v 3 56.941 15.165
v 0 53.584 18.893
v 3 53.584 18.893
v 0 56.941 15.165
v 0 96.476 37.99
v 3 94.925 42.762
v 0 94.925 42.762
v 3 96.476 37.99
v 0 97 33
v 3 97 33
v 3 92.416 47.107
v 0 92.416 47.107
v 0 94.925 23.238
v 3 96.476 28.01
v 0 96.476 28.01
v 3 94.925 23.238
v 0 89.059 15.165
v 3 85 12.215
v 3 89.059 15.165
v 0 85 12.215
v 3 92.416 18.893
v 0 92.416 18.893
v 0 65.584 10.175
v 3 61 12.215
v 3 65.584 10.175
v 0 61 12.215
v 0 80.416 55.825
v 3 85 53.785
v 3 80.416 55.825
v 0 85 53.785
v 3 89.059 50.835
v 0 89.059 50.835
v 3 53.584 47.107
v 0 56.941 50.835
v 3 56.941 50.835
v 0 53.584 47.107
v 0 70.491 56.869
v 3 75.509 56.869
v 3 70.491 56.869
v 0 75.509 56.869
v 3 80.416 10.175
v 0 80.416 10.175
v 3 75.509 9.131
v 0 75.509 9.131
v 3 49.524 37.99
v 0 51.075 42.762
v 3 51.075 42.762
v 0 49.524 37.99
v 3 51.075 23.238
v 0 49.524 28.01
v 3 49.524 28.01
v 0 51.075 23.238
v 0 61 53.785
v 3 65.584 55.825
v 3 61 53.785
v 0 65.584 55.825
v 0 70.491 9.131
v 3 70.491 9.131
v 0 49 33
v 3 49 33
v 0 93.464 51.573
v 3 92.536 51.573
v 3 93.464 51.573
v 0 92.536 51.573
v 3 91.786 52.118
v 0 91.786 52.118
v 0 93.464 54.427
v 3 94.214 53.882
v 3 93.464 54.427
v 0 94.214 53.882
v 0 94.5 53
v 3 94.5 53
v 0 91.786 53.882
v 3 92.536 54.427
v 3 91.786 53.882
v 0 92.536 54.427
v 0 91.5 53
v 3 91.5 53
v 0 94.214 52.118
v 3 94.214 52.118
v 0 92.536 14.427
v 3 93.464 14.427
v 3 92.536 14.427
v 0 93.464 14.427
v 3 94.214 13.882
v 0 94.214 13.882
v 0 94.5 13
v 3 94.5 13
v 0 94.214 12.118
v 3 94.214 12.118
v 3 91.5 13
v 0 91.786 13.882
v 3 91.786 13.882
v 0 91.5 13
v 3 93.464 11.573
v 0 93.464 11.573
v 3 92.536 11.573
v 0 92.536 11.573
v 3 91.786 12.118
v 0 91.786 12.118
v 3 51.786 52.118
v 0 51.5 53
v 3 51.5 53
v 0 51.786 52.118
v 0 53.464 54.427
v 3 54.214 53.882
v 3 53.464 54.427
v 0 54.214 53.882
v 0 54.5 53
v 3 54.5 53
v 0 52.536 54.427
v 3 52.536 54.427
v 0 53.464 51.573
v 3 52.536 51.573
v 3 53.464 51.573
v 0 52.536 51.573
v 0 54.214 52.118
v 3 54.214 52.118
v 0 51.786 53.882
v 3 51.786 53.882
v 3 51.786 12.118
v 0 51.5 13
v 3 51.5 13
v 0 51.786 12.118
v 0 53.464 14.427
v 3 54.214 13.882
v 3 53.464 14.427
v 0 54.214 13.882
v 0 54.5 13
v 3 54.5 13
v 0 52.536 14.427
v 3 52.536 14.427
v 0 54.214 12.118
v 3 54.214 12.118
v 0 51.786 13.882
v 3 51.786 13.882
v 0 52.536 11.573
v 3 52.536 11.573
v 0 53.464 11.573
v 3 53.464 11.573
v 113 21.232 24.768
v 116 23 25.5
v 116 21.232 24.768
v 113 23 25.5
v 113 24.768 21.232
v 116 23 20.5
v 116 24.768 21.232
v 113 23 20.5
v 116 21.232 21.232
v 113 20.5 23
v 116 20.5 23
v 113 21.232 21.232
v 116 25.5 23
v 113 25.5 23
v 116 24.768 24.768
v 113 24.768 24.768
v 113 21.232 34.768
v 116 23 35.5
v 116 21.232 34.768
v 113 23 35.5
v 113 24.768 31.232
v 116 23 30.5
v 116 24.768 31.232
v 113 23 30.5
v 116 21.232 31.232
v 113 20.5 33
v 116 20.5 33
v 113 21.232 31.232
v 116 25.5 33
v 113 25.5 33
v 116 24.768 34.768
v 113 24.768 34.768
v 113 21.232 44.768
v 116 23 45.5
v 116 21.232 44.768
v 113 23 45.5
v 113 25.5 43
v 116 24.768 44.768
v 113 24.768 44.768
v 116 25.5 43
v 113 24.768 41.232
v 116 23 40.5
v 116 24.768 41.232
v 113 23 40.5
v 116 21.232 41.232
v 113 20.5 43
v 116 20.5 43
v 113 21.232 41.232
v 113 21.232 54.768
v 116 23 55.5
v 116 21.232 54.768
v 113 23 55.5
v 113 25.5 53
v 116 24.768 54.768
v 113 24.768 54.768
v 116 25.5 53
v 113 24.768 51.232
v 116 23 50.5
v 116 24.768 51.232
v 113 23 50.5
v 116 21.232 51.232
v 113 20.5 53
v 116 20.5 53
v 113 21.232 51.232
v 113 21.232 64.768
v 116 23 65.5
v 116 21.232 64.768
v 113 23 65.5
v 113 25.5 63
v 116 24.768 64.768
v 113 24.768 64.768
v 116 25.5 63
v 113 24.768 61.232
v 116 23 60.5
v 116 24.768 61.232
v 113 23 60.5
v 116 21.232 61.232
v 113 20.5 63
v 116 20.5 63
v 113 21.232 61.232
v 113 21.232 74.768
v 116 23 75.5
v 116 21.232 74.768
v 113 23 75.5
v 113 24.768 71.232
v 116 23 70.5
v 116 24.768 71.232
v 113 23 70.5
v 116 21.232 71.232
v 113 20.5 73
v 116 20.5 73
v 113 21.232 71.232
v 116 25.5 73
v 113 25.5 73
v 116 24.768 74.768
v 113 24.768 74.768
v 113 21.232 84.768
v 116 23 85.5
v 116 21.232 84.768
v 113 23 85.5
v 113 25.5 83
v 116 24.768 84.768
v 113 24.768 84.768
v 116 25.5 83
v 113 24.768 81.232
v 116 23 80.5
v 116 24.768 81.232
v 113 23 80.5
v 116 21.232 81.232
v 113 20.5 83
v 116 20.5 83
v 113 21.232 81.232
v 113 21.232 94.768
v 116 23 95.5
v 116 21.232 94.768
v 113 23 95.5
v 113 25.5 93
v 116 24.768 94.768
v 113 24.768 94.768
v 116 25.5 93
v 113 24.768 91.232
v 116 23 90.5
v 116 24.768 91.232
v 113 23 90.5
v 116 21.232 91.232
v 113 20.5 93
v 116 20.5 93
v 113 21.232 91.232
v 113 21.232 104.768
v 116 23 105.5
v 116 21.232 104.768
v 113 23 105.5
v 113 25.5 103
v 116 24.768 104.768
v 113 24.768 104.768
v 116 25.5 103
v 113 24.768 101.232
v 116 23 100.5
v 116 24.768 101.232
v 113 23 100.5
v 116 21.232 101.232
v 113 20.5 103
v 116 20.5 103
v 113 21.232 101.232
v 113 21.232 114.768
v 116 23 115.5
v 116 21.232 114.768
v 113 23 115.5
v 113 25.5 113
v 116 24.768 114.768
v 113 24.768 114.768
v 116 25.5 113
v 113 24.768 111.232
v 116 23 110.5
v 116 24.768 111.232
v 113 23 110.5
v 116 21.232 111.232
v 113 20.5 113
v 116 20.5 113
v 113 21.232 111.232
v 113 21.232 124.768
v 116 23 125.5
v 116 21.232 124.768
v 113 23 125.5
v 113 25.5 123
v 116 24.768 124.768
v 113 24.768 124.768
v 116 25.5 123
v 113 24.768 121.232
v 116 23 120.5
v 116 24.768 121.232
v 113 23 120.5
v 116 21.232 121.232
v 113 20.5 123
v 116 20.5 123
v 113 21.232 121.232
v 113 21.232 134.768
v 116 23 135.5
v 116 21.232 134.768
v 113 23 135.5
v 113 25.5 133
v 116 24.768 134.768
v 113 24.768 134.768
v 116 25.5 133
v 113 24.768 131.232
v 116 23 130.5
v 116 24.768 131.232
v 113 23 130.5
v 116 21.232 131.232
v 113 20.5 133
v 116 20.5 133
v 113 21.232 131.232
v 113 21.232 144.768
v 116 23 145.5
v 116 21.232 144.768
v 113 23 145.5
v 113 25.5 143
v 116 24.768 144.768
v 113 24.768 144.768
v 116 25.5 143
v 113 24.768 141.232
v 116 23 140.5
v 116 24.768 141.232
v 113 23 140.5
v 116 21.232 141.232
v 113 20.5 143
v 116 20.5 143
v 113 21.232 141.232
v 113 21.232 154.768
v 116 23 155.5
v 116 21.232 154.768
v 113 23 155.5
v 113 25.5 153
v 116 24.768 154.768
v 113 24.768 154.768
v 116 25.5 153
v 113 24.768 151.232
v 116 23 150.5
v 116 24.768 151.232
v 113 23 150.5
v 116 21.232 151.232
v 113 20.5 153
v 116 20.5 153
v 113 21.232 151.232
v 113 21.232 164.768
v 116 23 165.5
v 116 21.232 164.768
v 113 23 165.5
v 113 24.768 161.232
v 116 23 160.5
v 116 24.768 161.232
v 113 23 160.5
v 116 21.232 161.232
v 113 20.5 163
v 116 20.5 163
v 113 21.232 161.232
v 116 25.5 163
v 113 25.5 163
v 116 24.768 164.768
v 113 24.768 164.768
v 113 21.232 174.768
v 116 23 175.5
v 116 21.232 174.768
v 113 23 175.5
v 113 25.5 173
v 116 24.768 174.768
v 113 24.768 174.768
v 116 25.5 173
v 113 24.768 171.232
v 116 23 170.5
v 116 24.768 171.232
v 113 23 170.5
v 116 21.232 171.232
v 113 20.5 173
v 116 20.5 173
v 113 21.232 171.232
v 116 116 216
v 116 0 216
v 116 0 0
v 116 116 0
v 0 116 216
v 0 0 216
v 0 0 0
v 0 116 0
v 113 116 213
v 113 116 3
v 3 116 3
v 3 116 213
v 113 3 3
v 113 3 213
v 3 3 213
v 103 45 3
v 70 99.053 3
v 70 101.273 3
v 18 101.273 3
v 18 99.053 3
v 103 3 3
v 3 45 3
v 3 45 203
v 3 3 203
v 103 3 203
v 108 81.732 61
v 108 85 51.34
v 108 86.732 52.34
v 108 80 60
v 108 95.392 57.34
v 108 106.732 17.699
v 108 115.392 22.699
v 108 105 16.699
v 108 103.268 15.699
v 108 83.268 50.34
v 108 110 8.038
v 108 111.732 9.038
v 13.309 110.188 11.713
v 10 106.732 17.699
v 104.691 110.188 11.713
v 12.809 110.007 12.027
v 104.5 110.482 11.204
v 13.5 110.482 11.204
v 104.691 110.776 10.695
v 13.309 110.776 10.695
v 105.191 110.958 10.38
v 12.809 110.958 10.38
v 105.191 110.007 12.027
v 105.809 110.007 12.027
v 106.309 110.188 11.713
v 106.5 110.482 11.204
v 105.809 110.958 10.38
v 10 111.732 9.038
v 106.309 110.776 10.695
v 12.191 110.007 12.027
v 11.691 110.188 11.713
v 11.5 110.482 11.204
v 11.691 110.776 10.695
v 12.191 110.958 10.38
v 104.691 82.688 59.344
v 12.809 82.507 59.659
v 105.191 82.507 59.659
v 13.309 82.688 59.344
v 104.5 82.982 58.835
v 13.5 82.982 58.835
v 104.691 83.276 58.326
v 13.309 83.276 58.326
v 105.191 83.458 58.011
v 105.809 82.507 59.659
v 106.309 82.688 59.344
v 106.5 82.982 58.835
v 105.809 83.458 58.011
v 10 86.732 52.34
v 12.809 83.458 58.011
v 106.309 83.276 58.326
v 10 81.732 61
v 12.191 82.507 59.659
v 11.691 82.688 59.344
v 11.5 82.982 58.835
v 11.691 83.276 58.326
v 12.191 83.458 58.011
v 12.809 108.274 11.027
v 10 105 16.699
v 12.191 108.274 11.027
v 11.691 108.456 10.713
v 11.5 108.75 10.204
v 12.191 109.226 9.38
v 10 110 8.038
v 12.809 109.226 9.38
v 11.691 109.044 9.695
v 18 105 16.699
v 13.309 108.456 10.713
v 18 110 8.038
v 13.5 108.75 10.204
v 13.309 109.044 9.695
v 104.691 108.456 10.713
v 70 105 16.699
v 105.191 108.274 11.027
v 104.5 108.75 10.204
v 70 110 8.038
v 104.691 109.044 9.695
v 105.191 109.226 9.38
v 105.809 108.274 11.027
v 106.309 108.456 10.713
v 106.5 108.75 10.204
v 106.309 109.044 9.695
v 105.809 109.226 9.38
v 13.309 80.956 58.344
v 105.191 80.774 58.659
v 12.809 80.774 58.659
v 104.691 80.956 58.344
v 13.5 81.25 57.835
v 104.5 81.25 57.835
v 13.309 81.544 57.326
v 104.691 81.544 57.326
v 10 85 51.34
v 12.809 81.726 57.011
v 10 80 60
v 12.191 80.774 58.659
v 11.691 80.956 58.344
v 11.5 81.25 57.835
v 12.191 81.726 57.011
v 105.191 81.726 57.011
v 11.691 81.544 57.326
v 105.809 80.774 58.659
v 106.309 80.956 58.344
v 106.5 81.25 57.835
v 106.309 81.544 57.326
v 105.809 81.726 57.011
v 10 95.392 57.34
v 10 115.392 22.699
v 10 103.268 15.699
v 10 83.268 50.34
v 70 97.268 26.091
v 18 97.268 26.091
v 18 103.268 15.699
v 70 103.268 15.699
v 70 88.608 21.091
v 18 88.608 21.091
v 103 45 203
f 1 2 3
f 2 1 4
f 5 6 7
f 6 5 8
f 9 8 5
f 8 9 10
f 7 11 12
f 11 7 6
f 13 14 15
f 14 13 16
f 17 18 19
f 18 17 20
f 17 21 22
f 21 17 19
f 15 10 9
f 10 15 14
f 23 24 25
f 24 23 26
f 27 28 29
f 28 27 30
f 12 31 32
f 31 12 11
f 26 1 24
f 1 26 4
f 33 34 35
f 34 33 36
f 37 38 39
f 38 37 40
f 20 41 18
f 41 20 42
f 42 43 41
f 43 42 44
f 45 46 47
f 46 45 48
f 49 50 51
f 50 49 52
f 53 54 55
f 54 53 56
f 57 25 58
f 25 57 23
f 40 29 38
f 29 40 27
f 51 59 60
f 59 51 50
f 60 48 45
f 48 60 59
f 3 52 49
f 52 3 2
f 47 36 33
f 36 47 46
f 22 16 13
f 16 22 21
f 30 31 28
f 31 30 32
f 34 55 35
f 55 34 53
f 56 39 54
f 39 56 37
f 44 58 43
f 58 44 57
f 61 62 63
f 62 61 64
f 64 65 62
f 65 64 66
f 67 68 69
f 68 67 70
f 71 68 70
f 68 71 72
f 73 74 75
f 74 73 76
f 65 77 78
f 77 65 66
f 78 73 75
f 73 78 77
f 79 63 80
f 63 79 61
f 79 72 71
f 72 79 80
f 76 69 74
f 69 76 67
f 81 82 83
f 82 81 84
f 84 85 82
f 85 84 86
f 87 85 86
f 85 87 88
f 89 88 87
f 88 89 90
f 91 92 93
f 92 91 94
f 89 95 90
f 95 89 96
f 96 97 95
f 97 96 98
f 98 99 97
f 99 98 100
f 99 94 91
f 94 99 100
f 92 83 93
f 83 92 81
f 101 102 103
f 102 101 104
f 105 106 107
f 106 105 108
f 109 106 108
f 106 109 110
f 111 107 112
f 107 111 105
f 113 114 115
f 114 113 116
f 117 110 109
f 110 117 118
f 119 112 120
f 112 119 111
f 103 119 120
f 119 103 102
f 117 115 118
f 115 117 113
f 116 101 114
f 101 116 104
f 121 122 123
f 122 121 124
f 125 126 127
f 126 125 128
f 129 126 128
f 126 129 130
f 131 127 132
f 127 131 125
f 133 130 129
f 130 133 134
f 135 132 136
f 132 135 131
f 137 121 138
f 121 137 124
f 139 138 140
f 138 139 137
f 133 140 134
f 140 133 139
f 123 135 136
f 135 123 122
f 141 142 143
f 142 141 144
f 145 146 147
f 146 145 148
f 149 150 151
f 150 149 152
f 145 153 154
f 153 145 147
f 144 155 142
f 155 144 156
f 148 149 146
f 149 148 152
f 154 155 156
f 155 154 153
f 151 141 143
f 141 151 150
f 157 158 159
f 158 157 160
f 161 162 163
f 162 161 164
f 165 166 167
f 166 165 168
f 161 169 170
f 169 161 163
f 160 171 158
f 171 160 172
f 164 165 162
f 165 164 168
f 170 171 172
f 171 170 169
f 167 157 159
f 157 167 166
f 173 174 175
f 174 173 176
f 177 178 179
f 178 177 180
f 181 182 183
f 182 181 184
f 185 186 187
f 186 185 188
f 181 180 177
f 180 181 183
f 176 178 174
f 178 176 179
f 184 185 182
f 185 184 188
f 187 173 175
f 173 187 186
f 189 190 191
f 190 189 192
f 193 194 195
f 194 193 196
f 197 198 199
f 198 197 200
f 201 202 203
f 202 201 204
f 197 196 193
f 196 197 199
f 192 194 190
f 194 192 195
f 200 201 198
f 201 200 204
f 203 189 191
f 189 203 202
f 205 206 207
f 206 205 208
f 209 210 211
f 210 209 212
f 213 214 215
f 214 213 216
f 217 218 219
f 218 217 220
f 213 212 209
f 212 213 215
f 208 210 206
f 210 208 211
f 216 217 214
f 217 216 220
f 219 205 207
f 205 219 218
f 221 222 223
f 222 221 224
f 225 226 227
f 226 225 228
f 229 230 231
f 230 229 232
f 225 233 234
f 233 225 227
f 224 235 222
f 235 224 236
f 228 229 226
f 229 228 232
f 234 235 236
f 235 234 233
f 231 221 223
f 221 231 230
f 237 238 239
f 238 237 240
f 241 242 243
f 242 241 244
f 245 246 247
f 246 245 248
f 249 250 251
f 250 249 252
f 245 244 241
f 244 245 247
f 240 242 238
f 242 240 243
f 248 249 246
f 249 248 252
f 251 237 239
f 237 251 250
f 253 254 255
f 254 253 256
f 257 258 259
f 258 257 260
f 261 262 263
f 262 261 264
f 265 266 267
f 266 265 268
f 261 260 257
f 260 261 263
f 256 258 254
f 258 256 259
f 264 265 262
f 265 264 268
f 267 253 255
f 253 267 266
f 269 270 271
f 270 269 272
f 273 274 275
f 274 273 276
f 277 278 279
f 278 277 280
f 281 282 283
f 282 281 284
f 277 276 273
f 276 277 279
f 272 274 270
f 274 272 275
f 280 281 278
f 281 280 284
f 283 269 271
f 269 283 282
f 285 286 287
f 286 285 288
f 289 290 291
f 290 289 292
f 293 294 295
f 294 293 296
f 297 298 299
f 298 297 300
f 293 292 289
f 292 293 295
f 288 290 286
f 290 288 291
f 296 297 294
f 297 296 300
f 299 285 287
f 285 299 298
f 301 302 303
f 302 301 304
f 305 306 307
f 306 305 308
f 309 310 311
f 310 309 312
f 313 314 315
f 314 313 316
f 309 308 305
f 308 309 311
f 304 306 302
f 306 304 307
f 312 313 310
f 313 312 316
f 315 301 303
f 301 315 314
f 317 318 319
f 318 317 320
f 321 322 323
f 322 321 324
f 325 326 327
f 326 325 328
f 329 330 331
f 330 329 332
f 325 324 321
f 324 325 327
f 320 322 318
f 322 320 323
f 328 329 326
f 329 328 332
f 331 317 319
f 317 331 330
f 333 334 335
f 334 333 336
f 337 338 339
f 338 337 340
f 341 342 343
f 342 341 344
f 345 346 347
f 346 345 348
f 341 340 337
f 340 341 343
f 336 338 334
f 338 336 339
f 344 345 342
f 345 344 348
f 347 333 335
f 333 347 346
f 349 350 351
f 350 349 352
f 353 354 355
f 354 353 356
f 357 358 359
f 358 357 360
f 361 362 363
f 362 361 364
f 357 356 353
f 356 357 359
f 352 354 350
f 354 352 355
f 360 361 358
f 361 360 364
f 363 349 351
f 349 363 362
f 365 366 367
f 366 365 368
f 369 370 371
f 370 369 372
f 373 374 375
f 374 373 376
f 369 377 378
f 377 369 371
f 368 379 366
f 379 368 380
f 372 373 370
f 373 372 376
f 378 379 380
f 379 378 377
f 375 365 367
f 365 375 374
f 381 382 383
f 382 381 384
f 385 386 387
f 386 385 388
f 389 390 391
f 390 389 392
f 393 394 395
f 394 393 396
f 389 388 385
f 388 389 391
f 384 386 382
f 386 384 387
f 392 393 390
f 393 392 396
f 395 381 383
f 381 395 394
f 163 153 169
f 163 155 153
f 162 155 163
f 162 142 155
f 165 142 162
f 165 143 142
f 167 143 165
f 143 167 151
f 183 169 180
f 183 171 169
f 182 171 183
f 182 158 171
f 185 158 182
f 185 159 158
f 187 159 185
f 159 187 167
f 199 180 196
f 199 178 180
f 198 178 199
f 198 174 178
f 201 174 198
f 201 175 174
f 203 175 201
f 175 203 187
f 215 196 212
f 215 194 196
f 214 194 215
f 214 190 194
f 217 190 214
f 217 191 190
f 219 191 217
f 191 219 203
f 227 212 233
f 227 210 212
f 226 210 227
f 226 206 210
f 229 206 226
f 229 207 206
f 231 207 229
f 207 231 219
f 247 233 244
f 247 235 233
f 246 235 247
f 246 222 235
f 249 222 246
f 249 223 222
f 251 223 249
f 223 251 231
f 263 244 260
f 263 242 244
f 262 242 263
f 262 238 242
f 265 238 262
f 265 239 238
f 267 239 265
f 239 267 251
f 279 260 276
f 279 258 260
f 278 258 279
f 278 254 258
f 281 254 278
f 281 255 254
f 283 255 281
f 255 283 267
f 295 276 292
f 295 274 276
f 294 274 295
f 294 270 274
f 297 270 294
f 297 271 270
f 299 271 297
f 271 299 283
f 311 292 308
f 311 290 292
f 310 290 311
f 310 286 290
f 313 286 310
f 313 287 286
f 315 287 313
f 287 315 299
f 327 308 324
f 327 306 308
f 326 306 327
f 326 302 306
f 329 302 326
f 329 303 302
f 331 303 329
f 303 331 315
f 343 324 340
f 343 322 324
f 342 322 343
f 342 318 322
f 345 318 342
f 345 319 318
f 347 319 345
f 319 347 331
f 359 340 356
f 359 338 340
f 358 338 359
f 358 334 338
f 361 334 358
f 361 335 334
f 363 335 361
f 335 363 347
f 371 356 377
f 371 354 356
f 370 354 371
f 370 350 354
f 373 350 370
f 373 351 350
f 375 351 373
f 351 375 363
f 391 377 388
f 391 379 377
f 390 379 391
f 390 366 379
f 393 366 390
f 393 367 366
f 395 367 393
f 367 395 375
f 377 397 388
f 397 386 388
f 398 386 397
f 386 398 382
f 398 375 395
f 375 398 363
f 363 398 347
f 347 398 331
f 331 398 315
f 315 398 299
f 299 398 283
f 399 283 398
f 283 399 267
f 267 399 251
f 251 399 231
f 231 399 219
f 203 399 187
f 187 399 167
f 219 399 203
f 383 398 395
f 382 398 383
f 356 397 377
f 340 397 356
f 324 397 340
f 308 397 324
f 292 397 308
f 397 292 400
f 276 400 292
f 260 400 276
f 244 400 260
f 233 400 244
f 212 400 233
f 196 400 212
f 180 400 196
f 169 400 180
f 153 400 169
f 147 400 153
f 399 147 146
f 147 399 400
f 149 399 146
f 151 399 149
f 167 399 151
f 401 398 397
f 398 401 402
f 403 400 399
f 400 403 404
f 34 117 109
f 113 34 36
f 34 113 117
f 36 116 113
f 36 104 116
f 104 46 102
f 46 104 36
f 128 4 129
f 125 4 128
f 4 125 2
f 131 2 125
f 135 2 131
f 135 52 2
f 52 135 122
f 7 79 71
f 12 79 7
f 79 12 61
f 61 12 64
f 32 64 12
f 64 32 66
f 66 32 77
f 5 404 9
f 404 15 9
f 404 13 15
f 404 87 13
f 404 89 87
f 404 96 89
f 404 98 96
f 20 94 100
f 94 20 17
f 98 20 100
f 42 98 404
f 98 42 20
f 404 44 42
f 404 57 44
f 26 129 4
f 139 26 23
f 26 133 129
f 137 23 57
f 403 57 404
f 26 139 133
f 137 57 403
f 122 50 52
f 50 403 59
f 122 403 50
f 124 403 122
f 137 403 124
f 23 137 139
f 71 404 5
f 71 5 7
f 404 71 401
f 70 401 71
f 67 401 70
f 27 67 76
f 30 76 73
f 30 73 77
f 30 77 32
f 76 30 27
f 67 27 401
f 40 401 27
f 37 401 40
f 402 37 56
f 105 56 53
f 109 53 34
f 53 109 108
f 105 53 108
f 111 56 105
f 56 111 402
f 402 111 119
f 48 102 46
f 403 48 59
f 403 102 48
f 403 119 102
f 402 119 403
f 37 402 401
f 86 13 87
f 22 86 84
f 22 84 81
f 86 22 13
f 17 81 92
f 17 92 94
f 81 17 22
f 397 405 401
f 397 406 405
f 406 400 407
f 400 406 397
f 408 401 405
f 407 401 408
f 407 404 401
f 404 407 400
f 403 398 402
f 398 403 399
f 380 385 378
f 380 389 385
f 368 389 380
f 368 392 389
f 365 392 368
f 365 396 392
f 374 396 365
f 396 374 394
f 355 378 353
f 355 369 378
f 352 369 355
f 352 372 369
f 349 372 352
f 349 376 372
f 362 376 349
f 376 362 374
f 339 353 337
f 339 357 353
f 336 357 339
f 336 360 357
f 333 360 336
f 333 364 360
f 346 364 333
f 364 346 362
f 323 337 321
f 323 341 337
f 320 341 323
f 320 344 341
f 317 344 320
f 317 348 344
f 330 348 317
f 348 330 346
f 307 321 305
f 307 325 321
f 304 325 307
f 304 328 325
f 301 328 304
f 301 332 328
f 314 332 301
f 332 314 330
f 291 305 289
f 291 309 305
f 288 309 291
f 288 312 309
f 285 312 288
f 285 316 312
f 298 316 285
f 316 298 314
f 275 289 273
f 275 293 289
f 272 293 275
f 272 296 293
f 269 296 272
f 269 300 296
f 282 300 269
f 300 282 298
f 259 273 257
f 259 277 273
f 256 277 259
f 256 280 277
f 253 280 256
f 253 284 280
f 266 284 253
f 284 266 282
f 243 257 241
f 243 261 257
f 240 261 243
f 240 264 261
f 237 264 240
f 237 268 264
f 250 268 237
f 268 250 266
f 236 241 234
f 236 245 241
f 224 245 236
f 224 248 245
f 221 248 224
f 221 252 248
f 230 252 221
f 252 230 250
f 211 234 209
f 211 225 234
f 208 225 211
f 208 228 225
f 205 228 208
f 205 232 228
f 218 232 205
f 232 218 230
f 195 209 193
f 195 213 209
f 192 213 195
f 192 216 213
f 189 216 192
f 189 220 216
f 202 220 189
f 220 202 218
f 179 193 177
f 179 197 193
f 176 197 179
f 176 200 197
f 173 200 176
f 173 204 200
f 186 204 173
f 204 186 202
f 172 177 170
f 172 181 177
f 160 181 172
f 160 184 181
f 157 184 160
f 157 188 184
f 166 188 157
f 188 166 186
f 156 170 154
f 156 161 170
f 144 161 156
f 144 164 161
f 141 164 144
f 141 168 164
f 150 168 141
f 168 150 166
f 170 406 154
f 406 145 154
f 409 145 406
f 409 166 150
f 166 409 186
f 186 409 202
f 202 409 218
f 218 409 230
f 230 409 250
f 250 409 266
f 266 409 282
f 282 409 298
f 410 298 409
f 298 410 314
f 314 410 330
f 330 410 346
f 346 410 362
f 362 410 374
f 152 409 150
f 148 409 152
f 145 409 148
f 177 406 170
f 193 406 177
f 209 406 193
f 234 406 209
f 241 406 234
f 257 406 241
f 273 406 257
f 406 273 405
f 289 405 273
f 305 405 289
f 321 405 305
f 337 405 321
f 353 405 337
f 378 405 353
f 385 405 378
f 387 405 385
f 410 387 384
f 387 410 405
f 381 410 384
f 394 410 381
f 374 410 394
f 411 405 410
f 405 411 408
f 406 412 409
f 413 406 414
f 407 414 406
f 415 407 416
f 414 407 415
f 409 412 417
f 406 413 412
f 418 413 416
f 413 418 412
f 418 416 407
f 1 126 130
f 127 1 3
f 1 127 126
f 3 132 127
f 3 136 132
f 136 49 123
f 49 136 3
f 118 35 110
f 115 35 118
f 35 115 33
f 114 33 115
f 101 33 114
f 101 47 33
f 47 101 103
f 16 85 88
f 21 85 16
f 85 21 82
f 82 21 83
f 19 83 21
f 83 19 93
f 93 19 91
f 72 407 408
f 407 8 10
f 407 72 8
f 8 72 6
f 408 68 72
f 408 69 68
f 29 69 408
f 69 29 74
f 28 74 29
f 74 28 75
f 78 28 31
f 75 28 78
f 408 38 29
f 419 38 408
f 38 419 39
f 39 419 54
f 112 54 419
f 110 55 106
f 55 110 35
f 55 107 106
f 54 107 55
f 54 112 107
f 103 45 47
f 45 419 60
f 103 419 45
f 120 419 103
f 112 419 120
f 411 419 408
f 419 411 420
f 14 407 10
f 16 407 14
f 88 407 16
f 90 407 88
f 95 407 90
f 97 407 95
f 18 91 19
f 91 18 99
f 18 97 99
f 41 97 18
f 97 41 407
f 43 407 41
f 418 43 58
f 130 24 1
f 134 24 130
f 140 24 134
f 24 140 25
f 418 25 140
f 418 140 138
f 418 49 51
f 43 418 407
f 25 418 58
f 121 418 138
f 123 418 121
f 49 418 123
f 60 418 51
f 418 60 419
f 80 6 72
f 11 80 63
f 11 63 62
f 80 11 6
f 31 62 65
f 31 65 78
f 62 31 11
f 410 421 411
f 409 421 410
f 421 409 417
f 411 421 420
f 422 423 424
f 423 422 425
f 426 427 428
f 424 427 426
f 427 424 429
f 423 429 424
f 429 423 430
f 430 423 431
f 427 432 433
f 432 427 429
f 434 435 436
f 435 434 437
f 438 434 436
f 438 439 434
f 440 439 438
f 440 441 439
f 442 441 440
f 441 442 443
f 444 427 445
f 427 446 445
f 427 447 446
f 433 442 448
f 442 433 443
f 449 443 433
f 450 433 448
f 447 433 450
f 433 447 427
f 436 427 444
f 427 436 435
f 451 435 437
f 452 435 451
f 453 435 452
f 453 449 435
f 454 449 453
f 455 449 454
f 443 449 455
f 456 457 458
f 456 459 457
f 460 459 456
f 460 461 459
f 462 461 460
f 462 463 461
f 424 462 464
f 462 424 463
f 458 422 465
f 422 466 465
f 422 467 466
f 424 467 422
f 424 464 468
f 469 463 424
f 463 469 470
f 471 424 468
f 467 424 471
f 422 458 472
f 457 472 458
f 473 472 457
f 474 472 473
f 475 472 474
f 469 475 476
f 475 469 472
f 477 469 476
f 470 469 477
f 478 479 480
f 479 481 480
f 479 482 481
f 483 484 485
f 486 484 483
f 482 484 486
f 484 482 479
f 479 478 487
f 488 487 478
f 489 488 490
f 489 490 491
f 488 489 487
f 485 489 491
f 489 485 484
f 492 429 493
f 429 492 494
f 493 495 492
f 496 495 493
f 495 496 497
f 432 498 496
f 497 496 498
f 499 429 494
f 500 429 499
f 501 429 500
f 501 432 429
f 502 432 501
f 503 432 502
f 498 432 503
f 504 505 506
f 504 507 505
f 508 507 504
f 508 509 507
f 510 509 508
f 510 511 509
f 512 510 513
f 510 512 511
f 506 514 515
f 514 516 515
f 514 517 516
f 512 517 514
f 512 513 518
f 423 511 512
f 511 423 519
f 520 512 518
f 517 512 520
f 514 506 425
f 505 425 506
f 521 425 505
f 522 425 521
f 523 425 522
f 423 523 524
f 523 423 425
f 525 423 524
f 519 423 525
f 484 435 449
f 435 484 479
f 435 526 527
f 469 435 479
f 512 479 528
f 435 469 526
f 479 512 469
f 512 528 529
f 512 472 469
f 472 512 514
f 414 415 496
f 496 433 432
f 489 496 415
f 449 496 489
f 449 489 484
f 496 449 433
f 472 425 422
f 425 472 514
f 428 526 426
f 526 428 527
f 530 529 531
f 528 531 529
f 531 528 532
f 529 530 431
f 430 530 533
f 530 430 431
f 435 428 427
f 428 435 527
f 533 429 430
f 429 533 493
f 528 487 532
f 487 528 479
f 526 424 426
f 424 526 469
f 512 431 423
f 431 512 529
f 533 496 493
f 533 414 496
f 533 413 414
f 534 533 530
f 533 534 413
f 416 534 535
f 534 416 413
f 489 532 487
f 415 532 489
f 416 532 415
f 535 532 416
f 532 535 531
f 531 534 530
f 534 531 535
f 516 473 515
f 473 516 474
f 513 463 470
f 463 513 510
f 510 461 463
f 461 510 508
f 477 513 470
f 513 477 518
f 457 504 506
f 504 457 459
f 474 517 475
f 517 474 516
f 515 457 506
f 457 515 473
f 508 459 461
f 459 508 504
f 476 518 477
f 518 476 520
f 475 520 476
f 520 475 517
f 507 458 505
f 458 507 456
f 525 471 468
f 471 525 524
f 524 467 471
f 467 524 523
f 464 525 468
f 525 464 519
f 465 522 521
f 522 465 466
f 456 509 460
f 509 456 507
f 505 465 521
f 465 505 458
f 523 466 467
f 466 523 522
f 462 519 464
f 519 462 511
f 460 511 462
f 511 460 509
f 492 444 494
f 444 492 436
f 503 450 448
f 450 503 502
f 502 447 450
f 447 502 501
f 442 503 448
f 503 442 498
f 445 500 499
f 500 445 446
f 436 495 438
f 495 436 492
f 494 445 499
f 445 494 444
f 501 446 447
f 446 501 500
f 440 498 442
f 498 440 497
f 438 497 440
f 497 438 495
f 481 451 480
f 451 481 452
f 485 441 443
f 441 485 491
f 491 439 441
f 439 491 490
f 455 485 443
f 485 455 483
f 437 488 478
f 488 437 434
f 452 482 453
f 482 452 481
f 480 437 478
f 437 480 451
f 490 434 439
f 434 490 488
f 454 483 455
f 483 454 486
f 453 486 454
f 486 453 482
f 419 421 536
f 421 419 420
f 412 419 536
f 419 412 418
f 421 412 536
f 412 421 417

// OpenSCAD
mainHousingInsideX = 110;
mainHousingInsideY = 110;
mainHousingInsideZ = 210;
t = 3;


module powerSupply()
{
    cube([200, 100, 42]);
}

module iecHoles(t)
{
    hs = 55.5-3.5;
    lc = 23;
    
    rotate(-90, [0, 0, 1]){
    translate([0, lc-hs/2, 10])
        rotate(90,[0,1,0])
            cylinder(t, 3/2,3/2, $fn=10);
    translate([0, lc+hs/2, 10])
        rotate(90,[0,1,0])
            cylinder(t, 3/2,3/2, $fn=10);
    translate()
        cube([t, 46, 20]);
    }
}

module fanHoles(t)
{
    
    //translate([0, lc-hs/2, 10])
        rotate(90,[1,0,0]){
            cylinder(t, 24,24);
            translate([20, 20, 0])
                cylinder(t, 3/2, 3/2, $fn=10);
            translate([20, -20, 0])
                cylinder(t, 3/2, 3/2, $fn=10);
            translate([-20, 20, 0])
                cylinder(t, 3/2, 3/2, $fn=10);
            translate([-20, -20, 0])
                cylinder(t, 3/2, 3/2, $fn=10);
        }
}


module displayHoles(t, r)
{
    $fn = 10;
    y = 55;
    x = 93;
    xo = (98-x)/2;
    yo = (60-y)/2;
    translate( [xo,yo, 0])
        cylinder(t, r, r);
    translate( [xo+x,yo, 0])
        cylinder(t, r, r);
    translate( [xo+x,yo+y, 0])
        cylinder(t, r, r);
    translate( [xo,yo+y, 0])
        cylinder(t, r, r);
}

module displayVolumes(){
    cube([98, 60, 2]);
    translate([0, 10, -2])
        cube([98, 40, 14]);
    translate([8, 60-22, -12])
        cube([52, 22, 12]);
}





module display()
{
    difference(){
        displayVolumes();
        translate([0,0,-1])
        displayHoles(5);
    }
    
}


module pcb(){
    cube([160, 100, 2]);
    translate([-20, 4, 2])
        cube([20, 92, 17]);
}


module mainHousing(sx, sy, sz, t){
    fanHoleY=70;
    fanHoleZ=30;
    exhaustSeparation = 10;
    difference(){
        cube([sx, sy, sz]);
        translate([t, t, t])
            cube([sx-2*t, sy-t+1, sz-2*t]);
        translate([-1, t+fanHoleY, t+fanHoleZ])
            rotate([0, 0, 90])
                fanHoles(t+2);    
        for(n = [0:15]){
            translate([sx-t-1, 20+t, 20+t+exhaustSeparation*n])
                rotate([0, 90, 0])
                    cylinder(t+2, 2.5, 2.5);
        }
    }
    
}

module placedPowerSupply(){
    translate([t, t, t])
        rotate([0, -90, -90])
            powerSupply();
}


mainHousing(mainHousingInsideX+2*t, mainHousingInsideY+2*t ,mainHousingInsideZ+2*t, t);

placedPowerSupply();

translate([10, 80, 60])
rotate([-60, 0, 0])
    display();
